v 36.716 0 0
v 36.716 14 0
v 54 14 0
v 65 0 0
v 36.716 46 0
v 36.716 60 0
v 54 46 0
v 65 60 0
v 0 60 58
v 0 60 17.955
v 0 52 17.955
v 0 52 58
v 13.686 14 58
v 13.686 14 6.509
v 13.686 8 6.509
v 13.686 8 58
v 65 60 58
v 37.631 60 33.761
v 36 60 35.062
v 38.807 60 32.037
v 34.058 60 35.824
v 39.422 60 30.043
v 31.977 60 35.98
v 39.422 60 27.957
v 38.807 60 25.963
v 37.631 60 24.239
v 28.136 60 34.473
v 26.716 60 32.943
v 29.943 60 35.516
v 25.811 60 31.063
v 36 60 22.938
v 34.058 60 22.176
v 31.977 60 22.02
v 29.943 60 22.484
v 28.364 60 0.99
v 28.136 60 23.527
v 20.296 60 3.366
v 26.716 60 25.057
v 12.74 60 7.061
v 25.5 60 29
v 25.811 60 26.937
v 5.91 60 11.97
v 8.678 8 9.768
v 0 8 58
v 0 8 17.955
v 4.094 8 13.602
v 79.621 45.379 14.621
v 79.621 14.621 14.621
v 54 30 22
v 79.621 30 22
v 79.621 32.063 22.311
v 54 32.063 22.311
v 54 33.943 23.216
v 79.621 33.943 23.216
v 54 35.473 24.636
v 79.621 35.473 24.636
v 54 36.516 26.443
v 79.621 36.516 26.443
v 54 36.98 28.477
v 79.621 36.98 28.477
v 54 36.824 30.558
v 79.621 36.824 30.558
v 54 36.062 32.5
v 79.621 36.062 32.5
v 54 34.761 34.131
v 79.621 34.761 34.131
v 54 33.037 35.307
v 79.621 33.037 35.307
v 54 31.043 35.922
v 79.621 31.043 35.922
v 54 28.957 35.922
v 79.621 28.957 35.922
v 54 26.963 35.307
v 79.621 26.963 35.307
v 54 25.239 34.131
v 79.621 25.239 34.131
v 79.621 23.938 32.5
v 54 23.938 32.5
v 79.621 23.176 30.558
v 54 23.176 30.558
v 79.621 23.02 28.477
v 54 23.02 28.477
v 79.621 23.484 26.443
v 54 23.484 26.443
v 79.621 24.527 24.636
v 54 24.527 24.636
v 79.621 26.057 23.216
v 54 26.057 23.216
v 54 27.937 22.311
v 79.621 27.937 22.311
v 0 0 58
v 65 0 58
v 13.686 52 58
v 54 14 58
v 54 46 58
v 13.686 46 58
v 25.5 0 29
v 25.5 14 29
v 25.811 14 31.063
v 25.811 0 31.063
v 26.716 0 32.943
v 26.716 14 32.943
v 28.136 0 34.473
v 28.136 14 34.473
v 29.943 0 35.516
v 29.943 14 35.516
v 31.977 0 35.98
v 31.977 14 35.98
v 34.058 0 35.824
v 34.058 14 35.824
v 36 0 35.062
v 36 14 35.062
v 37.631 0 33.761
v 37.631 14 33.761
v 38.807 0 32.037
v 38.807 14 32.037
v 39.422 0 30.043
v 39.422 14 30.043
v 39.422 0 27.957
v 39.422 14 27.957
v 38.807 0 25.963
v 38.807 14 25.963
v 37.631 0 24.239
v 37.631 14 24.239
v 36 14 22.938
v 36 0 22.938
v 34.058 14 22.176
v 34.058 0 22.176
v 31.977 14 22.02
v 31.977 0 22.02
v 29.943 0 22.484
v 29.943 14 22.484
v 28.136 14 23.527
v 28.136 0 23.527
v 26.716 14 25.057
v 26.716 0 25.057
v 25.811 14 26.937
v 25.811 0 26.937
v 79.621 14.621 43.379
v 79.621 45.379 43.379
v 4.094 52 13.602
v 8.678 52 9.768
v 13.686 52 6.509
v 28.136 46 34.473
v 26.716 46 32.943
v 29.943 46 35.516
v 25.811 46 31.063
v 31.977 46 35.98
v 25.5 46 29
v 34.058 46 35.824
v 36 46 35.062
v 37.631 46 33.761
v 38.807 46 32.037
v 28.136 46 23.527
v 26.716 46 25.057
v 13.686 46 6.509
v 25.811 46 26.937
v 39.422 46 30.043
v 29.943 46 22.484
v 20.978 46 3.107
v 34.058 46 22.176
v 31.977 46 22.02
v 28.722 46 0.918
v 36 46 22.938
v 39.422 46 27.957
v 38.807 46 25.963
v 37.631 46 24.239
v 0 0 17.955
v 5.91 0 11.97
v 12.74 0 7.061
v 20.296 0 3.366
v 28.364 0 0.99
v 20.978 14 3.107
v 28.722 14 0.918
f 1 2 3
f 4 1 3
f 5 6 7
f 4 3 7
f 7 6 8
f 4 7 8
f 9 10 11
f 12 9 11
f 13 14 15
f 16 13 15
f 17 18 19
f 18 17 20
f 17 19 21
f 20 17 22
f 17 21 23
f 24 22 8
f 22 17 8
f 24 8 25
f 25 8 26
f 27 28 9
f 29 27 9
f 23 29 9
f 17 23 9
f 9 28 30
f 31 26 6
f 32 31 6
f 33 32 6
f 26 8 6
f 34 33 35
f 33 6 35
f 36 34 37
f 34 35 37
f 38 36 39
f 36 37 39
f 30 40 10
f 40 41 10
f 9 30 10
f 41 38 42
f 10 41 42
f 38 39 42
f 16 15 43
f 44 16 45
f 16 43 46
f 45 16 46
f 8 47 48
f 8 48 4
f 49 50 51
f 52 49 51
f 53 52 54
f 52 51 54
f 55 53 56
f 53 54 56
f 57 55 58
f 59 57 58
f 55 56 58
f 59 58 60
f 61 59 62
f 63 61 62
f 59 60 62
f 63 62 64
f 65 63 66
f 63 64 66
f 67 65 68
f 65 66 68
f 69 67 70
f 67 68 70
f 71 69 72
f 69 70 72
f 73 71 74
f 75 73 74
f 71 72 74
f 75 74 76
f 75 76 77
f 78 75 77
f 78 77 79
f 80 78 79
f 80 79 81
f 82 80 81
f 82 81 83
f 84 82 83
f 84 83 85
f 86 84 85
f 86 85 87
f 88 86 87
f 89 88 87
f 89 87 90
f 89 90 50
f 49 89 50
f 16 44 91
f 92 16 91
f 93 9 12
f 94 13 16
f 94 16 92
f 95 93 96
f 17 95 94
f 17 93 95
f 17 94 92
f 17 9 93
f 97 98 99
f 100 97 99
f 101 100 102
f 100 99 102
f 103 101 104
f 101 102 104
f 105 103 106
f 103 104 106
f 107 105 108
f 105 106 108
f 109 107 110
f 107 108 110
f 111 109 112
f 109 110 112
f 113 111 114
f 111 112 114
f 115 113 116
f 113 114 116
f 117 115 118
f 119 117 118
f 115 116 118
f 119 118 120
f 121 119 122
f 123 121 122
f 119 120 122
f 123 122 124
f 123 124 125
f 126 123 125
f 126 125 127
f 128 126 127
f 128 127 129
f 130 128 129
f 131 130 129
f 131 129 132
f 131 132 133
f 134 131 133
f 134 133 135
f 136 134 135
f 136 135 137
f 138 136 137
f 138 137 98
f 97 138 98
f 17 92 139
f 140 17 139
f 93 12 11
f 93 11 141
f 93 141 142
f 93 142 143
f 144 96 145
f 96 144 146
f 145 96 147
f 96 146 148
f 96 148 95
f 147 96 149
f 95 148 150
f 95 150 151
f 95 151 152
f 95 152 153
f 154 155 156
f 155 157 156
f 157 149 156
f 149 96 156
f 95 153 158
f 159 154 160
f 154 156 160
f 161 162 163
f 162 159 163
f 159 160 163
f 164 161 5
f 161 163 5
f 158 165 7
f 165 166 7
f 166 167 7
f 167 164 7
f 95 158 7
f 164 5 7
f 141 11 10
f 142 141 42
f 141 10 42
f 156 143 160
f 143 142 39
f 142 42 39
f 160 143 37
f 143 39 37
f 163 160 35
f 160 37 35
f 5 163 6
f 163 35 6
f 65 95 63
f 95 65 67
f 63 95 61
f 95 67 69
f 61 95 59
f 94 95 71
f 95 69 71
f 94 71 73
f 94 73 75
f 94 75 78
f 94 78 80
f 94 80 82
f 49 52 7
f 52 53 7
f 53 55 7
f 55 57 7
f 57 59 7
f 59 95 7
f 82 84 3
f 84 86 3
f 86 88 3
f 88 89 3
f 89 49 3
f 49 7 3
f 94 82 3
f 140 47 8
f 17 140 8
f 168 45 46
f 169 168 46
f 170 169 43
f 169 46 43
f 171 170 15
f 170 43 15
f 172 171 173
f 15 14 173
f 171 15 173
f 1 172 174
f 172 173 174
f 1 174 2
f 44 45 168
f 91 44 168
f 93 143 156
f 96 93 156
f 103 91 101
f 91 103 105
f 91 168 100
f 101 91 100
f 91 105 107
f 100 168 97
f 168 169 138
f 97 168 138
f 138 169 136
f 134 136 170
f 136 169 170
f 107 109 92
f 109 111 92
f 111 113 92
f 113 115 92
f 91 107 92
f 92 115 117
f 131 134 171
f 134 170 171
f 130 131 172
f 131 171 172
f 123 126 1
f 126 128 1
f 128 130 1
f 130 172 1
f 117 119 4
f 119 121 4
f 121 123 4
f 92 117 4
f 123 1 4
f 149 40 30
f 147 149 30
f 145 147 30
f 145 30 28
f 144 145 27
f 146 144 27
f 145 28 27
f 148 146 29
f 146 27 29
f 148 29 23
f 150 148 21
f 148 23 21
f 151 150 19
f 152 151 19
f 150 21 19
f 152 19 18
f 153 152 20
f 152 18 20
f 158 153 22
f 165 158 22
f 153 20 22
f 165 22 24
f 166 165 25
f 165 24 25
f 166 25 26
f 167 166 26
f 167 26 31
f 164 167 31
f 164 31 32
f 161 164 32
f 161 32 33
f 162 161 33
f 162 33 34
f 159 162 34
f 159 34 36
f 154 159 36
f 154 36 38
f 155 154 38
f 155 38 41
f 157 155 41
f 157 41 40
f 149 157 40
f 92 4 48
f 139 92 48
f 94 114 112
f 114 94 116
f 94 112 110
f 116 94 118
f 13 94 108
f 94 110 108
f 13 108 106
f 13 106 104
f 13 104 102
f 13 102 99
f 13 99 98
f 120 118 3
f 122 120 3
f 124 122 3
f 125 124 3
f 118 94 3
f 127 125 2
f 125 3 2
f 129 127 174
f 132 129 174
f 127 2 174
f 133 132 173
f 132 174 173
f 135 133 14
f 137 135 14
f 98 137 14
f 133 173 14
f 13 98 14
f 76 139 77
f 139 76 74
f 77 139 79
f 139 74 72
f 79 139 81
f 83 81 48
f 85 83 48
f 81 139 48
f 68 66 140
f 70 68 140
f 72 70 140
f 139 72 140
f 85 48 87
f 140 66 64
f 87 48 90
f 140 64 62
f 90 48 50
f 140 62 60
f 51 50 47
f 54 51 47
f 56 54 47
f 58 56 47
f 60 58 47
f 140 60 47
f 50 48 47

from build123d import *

# Parameters (mm, degrees)
BOSS_EXTRUDE1_DEPTH = 58
SKETCH5_R           = 7
CUT_EXTRUDE1_DEPTH  = 116.341103519
SKETCH7_R           = 7
CUT_EXTRUDE2_DEPTH  = 116.341103519
CUT_EXTRUDE3_DEPTH  = 116.341103519
CUT_EXTRUDE4_DEPTH  = 116.341103519


with BuildPart() as part:
    # Sketch1 → Boss-Extrude1 (new body)
    with BuildSketch(Plane.XY):
        Polygon((0, 0), (65, 0), (79.621417728, 14.621417728), (79.621417728, 45.378582272), (65, 60), (0, 60), (0, 52), (13.686014712, 52), (13.686014712, 46), (54, 46), (54, 14), (13.686014712, 14), (13.686014712, 8), (0, 8), align=None)
    extrude(amount=BOSS_EXTRUDE1_DEPTH)

    # Sketch5 → Cut-Extrude1 (cut, through all)
    with BuildSketch(Plane(origin=(79.621417728, 0, 0), x_dir=(0, 0, -1), z_dir=(1, 0, 0))):
        with Locations((-29, 30)):
            Circle(SKETCH5_R)
    extrude(amount=-CUT_EXTRUDE1_DEPTH, mode=Mode.SUBTRACT)

    # Sketch7 → Cut-Extrude2 (cut, through all)
    with BuildSketch(Plane(origin=(0, 60, 0), x_dir=(1, 0, 0), z_dir=(0, 1, 0))):
        with Locations(Location((32.5, -29, 0), (0, 0, 180))):
            Circle(SKETCH7_R)
    extrude(amount=-CUT_EXTRUDE2_DEPTH, mode=Mode.SUBTRACT)

    # Sketch9 → Cut-Extrude3 (cut, through all)
    with BuildSketch(Plane(origin=(0, 0, 0), x_dir=(1, 0, 0), z_dir=(0, 1, 0))):
        Polygon((65, 0), (79.621417728, 0), (79.621417728, -14.621417728), align=None)
        Polygon((65, -58), (79.621417728, -43.378582272), (79.621417728, -58), align=None)
    extrude(amount=CUT_EXTRUDE3_DEPTH, mode=Mode.SUBTRACT)

    # Sketch11 → Cut-Extrude4 (cut, through all)
    with BuildSketch(Plane(origin=(0, 60, 0), x_dir=(1, 0, 0), z_dir=(0, 1, 0))):
        with BuildLine():
            Line((36.71635628, 0), (0, 0))
            Line((0, 0), (0, -17.954880359))
            ThreePointArc((0, -17.954880359), (16.439804094, -5.054512065), (36.71635628, 0))
        make_face()
    extrude(amount=-CUT_EXTRUDE4_DEPTH, mode=Mode.SUBTRACT)


solid = part.part
